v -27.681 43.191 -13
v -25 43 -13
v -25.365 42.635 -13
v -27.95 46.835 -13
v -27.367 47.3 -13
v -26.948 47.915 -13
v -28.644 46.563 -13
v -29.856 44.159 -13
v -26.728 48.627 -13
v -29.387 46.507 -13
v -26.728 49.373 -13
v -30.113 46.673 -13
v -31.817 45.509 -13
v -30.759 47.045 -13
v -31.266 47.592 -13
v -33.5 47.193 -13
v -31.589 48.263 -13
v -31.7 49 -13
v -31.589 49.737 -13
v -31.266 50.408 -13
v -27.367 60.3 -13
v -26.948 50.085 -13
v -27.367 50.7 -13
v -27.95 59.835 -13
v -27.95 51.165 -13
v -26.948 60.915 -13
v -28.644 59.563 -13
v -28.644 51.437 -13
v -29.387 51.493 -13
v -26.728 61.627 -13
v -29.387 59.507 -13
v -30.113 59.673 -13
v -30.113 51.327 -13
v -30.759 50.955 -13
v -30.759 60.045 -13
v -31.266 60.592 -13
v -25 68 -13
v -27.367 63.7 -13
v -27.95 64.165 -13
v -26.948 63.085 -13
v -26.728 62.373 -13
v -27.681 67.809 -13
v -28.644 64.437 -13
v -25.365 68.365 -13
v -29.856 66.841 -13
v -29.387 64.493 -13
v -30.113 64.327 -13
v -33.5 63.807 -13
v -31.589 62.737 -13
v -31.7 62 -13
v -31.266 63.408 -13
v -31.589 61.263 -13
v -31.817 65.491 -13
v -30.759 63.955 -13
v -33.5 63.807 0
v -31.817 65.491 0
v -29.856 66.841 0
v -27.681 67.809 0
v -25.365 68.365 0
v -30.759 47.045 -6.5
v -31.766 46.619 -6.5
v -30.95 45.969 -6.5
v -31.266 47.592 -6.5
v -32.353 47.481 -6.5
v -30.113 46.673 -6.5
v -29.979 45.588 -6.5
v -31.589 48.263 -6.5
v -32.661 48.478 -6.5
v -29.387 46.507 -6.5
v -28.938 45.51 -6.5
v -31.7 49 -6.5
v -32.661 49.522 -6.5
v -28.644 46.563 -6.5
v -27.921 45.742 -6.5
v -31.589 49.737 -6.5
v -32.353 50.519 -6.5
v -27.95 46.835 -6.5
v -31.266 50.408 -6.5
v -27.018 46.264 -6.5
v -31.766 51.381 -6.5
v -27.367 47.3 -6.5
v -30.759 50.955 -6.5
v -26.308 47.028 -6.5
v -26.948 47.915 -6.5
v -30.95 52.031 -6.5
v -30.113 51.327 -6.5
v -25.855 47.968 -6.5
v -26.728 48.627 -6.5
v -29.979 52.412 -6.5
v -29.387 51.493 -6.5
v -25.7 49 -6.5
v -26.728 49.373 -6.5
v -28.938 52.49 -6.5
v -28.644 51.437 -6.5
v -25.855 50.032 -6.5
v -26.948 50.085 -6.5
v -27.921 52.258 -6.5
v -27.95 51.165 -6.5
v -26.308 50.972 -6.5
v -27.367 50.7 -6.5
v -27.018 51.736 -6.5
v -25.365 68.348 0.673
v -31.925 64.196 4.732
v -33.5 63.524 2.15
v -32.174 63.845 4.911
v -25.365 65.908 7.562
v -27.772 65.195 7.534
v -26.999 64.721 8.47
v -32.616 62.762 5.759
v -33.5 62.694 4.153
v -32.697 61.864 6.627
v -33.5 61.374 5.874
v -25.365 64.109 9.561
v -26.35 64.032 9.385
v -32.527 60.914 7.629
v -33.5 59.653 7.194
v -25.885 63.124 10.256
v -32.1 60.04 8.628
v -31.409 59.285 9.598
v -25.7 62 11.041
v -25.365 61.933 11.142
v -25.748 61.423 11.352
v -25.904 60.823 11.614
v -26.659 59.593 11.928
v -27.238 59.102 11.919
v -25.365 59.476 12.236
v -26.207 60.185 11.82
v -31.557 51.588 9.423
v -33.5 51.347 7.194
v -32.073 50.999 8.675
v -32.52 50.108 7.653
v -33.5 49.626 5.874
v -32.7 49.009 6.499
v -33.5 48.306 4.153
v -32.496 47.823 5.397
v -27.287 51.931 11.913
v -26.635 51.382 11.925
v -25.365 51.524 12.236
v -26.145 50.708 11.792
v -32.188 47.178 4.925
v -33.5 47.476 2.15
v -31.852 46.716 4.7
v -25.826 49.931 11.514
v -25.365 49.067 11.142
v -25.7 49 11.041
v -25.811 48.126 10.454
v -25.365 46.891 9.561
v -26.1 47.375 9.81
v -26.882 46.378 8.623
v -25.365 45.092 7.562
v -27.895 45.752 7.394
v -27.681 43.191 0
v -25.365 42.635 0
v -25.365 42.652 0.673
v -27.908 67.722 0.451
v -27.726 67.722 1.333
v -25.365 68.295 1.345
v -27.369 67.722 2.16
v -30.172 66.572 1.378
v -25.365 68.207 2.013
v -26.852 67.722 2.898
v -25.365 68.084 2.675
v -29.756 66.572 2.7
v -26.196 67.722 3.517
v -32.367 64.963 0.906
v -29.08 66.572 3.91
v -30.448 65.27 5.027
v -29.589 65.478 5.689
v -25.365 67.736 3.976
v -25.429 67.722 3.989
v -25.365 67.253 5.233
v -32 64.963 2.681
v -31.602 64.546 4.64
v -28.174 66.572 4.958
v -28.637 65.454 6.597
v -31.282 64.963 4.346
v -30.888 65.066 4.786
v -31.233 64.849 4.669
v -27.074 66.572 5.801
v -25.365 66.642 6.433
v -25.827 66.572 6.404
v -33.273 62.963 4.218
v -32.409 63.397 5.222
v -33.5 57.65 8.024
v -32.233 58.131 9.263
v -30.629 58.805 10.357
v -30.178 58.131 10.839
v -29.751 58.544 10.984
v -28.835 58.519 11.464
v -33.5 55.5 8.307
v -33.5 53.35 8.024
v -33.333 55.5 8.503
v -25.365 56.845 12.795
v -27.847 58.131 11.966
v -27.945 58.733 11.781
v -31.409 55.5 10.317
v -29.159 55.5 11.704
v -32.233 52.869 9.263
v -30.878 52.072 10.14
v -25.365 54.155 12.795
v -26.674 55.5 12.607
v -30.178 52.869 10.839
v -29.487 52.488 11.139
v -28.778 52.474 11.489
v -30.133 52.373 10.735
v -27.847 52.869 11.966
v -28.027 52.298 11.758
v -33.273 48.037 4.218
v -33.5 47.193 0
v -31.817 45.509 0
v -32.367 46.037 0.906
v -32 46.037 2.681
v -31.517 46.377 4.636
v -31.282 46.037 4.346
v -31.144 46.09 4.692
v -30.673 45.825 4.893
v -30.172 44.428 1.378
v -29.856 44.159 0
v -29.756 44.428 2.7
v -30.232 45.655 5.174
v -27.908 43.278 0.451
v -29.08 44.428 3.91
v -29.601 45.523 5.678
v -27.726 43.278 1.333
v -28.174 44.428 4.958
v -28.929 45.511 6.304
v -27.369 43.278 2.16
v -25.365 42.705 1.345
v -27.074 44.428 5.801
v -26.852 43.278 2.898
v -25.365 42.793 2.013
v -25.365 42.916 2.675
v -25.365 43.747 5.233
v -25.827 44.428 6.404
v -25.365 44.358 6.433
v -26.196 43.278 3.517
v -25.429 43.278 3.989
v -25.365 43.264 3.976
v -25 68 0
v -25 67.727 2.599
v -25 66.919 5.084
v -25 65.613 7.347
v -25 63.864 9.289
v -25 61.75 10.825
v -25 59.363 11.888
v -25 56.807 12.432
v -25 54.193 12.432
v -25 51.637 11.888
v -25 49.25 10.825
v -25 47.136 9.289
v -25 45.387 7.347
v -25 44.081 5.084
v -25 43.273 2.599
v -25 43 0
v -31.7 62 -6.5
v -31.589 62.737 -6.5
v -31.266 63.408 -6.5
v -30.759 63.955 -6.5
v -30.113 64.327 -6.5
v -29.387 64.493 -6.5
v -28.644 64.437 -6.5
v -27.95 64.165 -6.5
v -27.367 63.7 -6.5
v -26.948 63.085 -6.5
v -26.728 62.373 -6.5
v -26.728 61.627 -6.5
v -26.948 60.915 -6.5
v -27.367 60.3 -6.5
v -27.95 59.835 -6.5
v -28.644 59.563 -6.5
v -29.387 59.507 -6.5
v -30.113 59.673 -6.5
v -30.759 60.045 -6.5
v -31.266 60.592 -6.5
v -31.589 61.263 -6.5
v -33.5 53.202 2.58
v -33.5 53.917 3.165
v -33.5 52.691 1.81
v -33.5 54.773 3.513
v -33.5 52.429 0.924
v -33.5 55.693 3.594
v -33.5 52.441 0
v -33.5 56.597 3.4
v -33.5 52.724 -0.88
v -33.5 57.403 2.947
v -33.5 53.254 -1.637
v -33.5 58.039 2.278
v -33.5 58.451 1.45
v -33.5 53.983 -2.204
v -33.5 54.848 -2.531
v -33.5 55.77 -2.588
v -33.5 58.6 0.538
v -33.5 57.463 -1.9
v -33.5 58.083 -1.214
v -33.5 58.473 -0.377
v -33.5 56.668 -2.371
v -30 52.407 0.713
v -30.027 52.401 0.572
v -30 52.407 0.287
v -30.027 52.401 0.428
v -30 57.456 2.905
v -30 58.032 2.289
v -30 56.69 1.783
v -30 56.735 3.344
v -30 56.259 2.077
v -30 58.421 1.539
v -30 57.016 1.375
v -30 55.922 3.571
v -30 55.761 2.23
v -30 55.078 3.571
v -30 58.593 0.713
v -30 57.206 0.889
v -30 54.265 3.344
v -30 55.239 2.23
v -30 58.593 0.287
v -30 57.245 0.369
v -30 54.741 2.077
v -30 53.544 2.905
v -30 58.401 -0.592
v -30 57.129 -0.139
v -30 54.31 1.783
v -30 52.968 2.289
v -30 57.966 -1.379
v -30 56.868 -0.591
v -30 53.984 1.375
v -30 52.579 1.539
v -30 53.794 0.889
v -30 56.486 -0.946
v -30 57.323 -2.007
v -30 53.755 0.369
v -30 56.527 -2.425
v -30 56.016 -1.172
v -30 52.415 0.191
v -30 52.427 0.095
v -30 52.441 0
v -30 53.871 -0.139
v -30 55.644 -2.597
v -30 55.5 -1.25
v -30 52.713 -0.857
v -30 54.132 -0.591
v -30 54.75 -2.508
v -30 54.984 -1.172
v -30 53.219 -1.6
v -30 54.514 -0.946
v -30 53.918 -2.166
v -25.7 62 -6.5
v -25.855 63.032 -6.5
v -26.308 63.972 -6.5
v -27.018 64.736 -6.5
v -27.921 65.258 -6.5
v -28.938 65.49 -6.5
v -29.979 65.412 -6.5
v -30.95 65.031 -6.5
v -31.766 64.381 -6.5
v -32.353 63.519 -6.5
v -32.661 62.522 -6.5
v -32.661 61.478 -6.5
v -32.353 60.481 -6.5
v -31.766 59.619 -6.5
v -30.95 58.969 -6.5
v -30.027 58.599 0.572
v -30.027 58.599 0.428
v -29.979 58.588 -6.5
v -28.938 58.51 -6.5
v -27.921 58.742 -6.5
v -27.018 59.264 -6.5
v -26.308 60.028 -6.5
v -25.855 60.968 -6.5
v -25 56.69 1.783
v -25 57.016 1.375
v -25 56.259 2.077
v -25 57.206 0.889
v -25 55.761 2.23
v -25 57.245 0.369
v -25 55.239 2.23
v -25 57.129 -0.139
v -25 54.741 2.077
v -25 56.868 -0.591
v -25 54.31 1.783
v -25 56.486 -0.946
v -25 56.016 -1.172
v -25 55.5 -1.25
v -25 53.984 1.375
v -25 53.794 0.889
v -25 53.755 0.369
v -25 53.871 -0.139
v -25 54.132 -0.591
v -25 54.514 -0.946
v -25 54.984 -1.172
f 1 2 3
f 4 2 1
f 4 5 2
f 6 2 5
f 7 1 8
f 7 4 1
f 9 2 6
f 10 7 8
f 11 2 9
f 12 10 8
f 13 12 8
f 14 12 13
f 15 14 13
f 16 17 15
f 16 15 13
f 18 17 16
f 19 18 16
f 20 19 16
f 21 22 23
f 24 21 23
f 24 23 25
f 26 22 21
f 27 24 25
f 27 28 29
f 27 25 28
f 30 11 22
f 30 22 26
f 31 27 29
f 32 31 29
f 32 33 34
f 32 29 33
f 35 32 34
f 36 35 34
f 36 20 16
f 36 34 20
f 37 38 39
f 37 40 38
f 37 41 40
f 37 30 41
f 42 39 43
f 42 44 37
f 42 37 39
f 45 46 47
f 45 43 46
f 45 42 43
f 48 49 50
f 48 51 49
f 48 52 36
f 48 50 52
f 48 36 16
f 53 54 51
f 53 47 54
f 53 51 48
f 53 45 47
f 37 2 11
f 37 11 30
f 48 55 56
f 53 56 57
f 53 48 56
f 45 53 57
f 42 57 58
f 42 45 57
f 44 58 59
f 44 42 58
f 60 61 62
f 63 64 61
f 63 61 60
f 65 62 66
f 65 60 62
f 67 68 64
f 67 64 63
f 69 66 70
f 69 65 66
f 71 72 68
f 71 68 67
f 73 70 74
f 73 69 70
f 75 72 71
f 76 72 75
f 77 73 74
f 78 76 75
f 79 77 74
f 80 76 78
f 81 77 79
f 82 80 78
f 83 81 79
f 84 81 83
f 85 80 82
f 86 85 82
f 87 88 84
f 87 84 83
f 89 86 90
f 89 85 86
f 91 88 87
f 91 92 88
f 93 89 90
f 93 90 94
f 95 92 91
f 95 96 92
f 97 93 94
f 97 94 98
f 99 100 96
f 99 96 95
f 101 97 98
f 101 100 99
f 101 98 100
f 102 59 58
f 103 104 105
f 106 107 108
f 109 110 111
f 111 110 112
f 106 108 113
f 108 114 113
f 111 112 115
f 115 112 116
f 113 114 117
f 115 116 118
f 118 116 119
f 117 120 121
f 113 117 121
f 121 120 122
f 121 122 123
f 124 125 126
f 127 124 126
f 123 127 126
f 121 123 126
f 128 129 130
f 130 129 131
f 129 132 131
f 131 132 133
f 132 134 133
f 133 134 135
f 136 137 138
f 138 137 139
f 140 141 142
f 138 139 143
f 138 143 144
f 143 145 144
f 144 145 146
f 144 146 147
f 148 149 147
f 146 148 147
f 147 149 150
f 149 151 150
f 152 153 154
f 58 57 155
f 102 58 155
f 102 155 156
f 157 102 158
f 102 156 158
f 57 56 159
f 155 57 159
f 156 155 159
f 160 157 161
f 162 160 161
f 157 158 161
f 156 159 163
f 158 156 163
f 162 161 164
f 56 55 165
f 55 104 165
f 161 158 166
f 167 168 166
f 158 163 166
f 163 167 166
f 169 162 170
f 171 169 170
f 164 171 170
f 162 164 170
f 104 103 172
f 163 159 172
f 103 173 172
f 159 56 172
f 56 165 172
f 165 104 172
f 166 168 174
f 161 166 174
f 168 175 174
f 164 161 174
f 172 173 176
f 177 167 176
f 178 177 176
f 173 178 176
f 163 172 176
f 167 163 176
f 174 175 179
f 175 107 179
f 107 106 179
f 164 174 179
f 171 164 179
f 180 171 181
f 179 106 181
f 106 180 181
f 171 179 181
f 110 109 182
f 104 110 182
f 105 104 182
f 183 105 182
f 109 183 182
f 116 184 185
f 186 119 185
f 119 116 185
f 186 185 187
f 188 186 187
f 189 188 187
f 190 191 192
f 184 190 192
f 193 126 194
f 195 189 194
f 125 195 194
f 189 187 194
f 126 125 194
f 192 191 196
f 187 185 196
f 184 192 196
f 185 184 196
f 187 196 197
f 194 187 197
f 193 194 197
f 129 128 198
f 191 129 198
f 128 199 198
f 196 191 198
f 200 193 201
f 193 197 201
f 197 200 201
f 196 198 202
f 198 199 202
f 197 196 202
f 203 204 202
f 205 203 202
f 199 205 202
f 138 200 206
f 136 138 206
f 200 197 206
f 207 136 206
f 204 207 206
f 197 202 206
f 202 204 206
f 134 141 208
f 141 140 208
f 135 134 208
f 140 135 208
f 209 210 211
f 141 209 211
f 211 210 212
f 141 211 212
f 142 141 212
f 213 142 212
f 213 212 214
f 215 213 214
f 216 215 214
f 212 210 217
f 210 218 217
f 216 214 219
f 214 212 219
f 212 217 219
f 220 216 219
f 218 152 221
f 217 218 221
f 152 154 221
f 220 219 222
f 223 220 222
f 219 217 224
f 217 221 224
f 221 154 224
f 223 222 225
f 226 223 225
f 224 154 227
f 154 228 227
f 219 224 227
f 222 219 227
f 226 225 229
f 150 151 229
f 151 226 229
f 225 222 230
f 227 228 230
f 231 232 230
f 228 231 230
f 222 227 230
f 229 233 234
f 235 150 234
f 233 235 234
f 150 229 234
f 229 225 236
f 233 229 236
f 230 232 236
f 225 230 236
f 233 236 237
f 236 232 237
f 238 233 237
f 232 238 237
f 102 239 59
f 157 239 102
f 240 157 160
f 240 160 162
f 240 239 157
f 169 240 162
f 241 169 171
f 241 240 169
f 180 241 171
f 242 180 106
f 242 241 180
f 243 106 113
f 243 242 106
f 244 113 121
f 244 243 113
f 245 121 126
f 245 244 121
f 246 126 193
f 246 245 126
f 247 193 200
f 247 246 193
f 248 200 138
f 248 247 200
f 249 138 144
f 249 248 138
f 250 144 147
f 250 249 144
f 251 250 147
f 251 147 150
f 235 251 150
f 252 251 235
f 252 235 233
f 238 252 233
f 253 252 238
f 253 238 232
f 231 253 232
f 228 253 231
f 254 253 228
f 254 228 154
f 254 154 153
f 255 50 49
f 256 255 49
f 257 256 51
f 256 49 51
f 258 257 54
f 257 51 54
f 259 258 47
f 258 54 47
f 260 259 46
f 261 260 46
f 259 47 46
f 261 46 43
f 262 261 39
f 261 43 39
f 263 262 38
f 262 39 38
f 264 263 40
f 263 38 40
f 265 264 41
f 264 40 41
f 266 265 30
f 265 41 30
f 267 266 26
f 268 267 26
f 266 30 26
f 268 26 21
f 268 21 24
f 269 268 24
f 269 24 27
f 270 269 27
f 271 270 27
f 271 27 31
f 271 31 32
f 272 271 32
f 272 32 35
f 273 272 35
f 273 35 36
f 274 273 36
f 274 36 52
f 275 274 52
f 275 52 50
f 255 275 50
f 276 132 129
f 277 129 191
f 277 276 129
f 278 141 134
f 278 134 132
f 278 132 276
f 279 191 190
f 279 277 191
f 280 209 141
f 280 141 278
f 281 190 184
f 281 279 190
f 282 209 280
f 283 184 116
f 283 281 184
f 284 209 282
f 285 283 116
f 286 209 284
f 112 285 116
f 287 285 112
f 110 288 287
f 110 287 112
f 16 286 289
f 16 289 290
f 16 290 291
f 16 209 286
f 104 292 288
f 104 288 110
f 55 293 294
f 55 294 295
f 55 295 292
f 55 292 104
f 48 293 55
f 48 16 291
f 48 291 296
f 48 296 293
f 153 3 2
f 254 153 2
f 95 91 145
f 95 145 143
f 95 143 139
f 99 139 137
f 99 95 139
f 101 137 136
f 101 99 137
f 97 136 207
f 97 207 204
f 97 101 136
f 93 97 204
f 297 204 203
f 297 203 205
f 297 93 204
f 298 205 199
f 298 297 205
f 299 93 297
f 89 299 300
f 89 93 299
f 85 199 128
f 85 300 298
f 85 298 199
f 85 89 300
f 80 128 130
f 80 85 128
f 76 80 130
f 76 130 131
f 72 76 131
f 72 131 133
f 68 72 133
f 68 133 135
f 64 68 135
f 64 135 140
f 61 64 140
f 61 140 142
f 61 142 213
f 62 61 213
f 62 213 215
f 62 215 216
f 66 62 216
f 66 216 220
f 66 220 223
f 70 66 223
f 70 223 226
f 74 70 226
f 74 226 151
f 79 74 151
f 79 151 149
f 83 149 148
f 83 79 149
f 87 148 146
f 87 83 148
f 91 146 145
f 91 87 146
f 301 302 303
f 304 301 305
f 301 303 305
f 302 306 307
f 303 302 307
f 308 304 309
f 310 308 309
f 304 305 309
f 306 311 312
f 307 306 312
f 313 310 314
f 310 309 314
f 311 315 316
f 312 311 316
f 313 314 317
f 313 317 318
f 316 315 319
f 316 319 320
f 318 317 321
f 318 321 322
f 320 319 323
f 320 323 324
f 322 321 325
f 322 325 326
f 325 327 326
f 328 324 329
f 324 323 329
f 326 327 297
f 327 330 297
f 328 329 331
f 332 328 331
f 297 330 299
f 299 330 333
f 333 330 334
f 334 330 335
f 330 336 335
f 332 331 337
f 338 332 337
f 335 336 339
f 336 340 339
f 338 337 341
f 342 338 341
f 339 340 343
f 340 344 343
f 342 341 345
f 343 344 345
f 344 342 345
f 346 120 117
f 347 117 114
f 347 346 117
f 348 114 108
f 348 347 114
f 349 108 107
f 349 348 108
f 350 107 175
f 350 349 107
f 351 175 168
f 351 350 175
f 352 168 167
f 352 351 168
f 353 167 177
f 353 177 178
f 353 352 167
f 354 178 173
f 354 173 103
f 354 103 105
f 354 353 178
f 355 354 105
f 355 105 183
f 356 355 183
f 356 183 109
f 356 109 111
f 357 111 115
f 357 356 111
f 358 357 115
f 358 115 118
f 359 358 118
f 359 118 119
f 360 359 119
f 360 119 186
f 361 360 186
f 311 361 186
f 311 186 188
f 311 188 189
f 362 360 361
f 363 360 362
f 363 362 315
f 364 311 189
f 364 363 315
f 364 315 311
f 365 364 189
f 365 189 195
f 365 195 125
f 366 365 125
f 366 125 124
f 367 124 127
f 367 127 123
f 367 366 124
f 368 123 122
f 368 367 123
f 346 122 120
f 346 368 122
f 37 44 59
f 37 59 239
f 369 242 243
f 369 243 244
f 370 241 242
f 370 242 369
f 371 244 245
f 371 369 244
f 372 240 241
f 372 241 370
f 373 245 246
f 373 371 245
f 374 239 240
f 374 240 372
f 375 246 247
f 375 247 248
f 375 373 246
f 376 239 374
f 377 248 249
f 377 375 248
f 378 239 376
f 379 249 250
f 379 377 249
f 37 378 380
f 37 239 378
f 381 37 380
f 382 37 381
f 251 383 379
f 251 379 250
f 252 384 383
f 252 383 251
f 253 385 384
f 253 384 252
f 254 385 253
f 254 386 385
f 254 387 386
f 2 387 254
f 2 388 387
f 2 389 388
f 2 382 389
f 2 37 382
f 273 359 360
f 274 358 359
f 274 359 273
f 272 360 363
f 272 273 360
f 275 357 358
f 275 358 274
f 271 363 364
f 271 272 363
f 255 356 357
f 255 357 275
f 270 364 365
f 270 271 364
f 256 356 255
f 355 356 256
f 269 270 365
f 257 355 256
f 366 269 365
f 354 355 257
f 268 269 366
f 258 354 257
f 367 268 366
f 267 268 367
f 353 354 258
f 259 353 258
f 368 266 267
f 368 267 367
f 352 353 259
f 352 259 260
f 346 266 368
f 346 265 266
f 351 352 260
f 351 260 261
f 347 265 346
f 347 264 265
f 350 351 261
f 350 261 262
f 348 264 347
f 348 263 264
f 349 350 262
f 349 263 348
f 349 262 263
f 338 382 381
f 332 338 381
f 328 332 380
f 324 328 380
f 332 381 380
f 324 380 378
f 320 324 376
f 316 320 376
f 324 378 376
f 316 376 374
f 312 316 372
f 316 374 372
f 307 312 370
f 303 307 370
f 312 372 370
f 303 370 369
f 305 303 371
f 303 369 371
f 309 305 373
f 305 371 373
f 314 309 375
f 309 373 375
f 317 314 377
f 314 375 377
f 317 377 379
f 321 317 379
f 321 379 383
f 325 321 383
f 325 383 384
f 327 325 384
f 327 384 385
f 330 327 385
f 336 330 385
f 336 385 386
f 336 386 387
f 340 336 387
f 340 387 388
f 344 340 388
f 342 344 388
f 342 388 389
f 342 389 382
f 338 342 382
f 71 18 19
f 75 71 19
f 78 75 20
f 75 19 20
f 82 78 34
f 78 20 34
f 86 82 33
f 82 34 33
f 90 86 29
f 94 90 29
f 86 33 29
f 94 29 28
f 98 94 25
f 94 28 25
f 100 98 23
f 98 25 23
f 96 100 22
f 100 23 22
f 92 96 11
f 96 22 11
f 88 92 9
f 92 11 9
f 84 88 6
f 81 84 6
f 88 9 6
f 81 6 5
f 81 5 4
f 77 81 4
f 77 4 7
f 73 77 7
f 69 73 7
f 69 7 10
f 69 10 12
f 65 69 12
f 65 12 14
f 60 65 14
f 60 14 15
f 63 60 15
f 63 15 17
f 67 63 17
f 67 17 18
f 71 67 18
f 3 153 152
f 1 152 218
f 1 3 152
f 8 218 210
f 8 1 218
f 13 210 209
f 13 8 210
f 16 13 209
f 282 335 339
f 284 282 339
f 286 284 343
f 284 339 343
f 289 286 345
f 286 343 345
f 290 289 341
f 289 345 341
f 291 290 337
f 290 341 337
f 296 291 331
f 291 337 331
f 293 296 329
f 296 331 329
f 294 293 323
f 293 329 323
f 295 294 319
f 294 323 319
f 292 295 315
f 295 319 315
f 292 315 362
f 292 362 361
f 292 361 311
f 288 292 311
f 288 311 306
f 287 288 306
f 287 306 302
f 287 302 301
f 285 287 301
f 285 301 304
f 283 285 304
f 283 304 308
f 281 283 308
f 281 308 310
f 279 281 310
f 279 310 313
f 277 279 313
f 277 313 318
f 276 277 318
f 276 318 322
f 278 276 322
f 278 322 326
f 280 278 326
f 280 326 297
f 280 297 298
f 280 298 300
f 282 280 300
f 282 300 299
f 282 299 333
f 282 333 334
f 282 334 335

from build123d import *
from build123d.topology import SkipClean

# Parameters (mm, degrees)
REVOLU_O1_ANGLE            = 90
ESBO_O3_R                  = 2.5
CORTE_EXTRUS_O1_DEPTH      = 79.698792875
RESSALTO_EXTRUS_O1_START   = 13
ESBO_O7_R                  = 2.5
RESSALTO_EXTRUS_O1_DEPTH   = 13
CORTE_EXTRUS_O3_DEPTH      = 79.698792875
CORTE_EXTRUS_O3_DEPTH_BACK = 6.5
ESBO_O4_R                  = 3.5
ESBO_O6_R                  = 1.75
CORTE_EXTRUS_O4_DEPTH      = 71.924255371
CORTE_EXTRUS_O5_START      = -6.5
ESBO_O8_R                  = 3.1
CORTE_EXTRUS_O5_DEPTH      = 13
CHANFRO1_SIZE              = 2
CORTE_EXTRUS_O6_DEPTH      = 82.701335058
CORTE_EXTRUS_O7_DEPTH      = 81.405896153


with BuildPart() as part:
    # Esboço2 → Revolução1 (revolve)
    with BuildSketch(Plane.XY):
        with BuildLine():
            Line((-23.5, 42.5), (-23.5, 68.5))
            ThreePointArc((-23.5, 68.5), (-36.5, 55.5), (-23.5, 42.5))
        make_face()
    revolve(axis=Axis((-23.5, 42.5, 0), (0, 1, 0)), revolution_arc=REVOLU_O1_ANGLE)

    # Esboço3 → Corte-extrusão1 (cut, through all)
    with BuildSketch(Plane.XY):
        with Locations(Location((-29.2, 62, 0), (0, 0, 142.736397609))):
            Circle(ESBO_O3_R)
        with Locations(Location((-29.2, 49, 0), (0, 0, 233.94500715))):
            Circle(ESBO_O3_R)
    extrude(amount=CORTE_EXTRUS_O1_DEPTH, mode=Mode.SUBTRACT)

    # Esboço7 → Ressalto-extrusão1 (add)
    with SkipClean():  # the faces are left unmerged after this step: merging them gives an invalid solid
        with BuildSketch(Plane(origin=(0, 0, 0), x_dir=(-1, 0, 0), z_dir=(0, 0, -1)).offset(RESSALTO_EXTRUS_O1_START)):
            with BuildLine():
                Line((23.5, 68.5), (23.5, 42.5))
                ThreePointArc((23.5, 42.5), (36.5, 55.5), (23.5, 68.5))
            make_face()
            with Locations((29.2, 62)):
                Circle(ESBO_O7_R, mode=Mode.SUBTRACT)
            with Locations((29.2, 49)):
                Circle(ESBO_O7_R, mode=Mode.SUBTRACT)
        extrude(amount=-RESSALTO_EXTRUS_O1_DEPTH)

    # Esboço4 → Corte-extrusão3 (cut, two sides: drawn at the far end of the back side and taken through both)
    with BuildSketch(Plane.XY.offset(-CORTE_EXTRUS_O3_DEPTH_BACK)):
        with Locations((-29.2, 62)):
            Circle(ESBO_O4_R)
        with Locations((-29.2, 49)):
            Circle(ESBO_O4_R)
    extrude(amount=CORTE_EXTRUS_O3_DEPTH + CORTE_EXTRUS_O3_DEPTH_BACK, mode=Mode.SUBTRACT)

    # Esboço6 → Corte-extrusão4 (cut, through all)
    with BuildSketch(Plane(origin=(-23.5, 0, 0), x_dir=(0, 0, -1), z_dir=(1, 0, 0))):
        with Locations((-0.5, 55.5)):
            Circle(ESBO_O6_R)
    extrude(amount=-CORTE_EXTRUS_O4_DEPTH, mode=Mode.SUBTRACT)

    # Esboço8 → Corte-extrusão5 (cut)
    with BuildSketch(Plane(origin=(-23.5, 0, 0), x_dir=(0, 0, -1), z_dir=(1, 0, 0)).offset(CORTE_EXTRUS_O5_START)):
        with Locations(Location((-0.5, 55.5, 0), (0, 0, 279.281799091))):
            Circle(ESBO_O8_R)
    extrude(amount=-CORTE_EXTRUS_O5_DEPTH, mode=Mode.SUBTRACT)

    # Chanfro1
    # the kernel refuses this chamfer: 2 mm, written as the material it takes off along each edge
    with BuildSketch(Plane(origin=(-23.5, 42.5, -18.143365976), x_dir=(-0.9974093352150653, 0.07193481789677074, 0), z_dir=(0, 0, 1))) as chanfro1_piece_1:
        with BuildLine():
            Line((1.870305265, 0), (CHANFRO1_SIZE * 0.0719348178968, -CHANFRO1_SIZE * 0.997409335215))
            Line((CHANFRO1_SIZE * 0.0719348178968, -CHANFRO1_SIZE * 0.997409335215), (0, 0))
            ThreePointArc((0, 0), (0.961335866, 0.033652274), (1.870305265, 0))
        make_face()
    extrude(amount=18.143365976, mode=Mode.SUBTRACT)
    with BuildSketch(Plane(origin=(-23.5, 68.5, -18.143365976), x_dir=(-0.9974093352150653, -0.07193481789677116, 0), z_dir=(0, 0, 1))) as chanfro1_piece_2:
        with BuildLine():
            Line((1.870305265, 0), (CHANFRO1_SIZE * 0.0719348178968, CHANFRO1_SIZE * 0.997409335215))
            Line((CHANFRO1_SIZE * 0.0719348178968, CHANFRO1_SIZE * 0.997409335215), (0, 0))
            ThreePointArc((0, 0), (0.961335866, -0.033652274), (1.870305265, 0))
        make_face()
    extrude(amount=18.143365976, mode=Mode.SUBTRACT)
    with BuildSketch(Plane(origin=(-23.5, 55.5, 0), x_dir=(0, 1, 0), z_dir=(0, 0, -1))) as chanfro1_piece_3:
        with BuildLine():
            Line((12.865459931, -1.865459931), (13 - CHANFRO1_SIZE, 0))
            Line((13 - CHANFRO1_SIZE, 0), (13, 0))
            ThreePointArc((13, 0), (12.964411572, -0.961266138), (12.865459931, -1.865459931))
        make_face()
    revolve(axis=Axis((-23.5, 55.5, 0), (1, 0, 0)), revolution_arc=180, mode=Mode.SUBTRACT)

    # Esboço9 → Corte-extrusão6 (cut, through all)
    with BuildSketch(Plane(origin=(0, 0, -13), x_dir=(-1, 0, 0), z_dir=(0, 0, -1))):
        with BuildLine():
            Line((33.5, 47.193376137), (33.5, 63.806623863))
            ThreePointArc((33.5, 63.806623863), (36.5, 55.5), (33.5, 47.193376137))
        make_face()
    extrude(amount=-CORTE_EXTRUS_O6_DEPTH, mode=Mode.SUBTRACT)

    # Esboço10 → Corte-extrusão7 (cut, through all)
    with BuildSketch(Plane(origin=(0, 0, -13), x_dir=(-1, 0, 0), z_dir=(0, 0, -1))):
        Polygon((25, 68), (25, 43), (23.5, 44.5), (23.5, 66.5), align=None)
    extrude(amount=-CORTE_EXTRUS_O7_DEPTH, mode=Mode.SUBTRACT)


solid = part.part
